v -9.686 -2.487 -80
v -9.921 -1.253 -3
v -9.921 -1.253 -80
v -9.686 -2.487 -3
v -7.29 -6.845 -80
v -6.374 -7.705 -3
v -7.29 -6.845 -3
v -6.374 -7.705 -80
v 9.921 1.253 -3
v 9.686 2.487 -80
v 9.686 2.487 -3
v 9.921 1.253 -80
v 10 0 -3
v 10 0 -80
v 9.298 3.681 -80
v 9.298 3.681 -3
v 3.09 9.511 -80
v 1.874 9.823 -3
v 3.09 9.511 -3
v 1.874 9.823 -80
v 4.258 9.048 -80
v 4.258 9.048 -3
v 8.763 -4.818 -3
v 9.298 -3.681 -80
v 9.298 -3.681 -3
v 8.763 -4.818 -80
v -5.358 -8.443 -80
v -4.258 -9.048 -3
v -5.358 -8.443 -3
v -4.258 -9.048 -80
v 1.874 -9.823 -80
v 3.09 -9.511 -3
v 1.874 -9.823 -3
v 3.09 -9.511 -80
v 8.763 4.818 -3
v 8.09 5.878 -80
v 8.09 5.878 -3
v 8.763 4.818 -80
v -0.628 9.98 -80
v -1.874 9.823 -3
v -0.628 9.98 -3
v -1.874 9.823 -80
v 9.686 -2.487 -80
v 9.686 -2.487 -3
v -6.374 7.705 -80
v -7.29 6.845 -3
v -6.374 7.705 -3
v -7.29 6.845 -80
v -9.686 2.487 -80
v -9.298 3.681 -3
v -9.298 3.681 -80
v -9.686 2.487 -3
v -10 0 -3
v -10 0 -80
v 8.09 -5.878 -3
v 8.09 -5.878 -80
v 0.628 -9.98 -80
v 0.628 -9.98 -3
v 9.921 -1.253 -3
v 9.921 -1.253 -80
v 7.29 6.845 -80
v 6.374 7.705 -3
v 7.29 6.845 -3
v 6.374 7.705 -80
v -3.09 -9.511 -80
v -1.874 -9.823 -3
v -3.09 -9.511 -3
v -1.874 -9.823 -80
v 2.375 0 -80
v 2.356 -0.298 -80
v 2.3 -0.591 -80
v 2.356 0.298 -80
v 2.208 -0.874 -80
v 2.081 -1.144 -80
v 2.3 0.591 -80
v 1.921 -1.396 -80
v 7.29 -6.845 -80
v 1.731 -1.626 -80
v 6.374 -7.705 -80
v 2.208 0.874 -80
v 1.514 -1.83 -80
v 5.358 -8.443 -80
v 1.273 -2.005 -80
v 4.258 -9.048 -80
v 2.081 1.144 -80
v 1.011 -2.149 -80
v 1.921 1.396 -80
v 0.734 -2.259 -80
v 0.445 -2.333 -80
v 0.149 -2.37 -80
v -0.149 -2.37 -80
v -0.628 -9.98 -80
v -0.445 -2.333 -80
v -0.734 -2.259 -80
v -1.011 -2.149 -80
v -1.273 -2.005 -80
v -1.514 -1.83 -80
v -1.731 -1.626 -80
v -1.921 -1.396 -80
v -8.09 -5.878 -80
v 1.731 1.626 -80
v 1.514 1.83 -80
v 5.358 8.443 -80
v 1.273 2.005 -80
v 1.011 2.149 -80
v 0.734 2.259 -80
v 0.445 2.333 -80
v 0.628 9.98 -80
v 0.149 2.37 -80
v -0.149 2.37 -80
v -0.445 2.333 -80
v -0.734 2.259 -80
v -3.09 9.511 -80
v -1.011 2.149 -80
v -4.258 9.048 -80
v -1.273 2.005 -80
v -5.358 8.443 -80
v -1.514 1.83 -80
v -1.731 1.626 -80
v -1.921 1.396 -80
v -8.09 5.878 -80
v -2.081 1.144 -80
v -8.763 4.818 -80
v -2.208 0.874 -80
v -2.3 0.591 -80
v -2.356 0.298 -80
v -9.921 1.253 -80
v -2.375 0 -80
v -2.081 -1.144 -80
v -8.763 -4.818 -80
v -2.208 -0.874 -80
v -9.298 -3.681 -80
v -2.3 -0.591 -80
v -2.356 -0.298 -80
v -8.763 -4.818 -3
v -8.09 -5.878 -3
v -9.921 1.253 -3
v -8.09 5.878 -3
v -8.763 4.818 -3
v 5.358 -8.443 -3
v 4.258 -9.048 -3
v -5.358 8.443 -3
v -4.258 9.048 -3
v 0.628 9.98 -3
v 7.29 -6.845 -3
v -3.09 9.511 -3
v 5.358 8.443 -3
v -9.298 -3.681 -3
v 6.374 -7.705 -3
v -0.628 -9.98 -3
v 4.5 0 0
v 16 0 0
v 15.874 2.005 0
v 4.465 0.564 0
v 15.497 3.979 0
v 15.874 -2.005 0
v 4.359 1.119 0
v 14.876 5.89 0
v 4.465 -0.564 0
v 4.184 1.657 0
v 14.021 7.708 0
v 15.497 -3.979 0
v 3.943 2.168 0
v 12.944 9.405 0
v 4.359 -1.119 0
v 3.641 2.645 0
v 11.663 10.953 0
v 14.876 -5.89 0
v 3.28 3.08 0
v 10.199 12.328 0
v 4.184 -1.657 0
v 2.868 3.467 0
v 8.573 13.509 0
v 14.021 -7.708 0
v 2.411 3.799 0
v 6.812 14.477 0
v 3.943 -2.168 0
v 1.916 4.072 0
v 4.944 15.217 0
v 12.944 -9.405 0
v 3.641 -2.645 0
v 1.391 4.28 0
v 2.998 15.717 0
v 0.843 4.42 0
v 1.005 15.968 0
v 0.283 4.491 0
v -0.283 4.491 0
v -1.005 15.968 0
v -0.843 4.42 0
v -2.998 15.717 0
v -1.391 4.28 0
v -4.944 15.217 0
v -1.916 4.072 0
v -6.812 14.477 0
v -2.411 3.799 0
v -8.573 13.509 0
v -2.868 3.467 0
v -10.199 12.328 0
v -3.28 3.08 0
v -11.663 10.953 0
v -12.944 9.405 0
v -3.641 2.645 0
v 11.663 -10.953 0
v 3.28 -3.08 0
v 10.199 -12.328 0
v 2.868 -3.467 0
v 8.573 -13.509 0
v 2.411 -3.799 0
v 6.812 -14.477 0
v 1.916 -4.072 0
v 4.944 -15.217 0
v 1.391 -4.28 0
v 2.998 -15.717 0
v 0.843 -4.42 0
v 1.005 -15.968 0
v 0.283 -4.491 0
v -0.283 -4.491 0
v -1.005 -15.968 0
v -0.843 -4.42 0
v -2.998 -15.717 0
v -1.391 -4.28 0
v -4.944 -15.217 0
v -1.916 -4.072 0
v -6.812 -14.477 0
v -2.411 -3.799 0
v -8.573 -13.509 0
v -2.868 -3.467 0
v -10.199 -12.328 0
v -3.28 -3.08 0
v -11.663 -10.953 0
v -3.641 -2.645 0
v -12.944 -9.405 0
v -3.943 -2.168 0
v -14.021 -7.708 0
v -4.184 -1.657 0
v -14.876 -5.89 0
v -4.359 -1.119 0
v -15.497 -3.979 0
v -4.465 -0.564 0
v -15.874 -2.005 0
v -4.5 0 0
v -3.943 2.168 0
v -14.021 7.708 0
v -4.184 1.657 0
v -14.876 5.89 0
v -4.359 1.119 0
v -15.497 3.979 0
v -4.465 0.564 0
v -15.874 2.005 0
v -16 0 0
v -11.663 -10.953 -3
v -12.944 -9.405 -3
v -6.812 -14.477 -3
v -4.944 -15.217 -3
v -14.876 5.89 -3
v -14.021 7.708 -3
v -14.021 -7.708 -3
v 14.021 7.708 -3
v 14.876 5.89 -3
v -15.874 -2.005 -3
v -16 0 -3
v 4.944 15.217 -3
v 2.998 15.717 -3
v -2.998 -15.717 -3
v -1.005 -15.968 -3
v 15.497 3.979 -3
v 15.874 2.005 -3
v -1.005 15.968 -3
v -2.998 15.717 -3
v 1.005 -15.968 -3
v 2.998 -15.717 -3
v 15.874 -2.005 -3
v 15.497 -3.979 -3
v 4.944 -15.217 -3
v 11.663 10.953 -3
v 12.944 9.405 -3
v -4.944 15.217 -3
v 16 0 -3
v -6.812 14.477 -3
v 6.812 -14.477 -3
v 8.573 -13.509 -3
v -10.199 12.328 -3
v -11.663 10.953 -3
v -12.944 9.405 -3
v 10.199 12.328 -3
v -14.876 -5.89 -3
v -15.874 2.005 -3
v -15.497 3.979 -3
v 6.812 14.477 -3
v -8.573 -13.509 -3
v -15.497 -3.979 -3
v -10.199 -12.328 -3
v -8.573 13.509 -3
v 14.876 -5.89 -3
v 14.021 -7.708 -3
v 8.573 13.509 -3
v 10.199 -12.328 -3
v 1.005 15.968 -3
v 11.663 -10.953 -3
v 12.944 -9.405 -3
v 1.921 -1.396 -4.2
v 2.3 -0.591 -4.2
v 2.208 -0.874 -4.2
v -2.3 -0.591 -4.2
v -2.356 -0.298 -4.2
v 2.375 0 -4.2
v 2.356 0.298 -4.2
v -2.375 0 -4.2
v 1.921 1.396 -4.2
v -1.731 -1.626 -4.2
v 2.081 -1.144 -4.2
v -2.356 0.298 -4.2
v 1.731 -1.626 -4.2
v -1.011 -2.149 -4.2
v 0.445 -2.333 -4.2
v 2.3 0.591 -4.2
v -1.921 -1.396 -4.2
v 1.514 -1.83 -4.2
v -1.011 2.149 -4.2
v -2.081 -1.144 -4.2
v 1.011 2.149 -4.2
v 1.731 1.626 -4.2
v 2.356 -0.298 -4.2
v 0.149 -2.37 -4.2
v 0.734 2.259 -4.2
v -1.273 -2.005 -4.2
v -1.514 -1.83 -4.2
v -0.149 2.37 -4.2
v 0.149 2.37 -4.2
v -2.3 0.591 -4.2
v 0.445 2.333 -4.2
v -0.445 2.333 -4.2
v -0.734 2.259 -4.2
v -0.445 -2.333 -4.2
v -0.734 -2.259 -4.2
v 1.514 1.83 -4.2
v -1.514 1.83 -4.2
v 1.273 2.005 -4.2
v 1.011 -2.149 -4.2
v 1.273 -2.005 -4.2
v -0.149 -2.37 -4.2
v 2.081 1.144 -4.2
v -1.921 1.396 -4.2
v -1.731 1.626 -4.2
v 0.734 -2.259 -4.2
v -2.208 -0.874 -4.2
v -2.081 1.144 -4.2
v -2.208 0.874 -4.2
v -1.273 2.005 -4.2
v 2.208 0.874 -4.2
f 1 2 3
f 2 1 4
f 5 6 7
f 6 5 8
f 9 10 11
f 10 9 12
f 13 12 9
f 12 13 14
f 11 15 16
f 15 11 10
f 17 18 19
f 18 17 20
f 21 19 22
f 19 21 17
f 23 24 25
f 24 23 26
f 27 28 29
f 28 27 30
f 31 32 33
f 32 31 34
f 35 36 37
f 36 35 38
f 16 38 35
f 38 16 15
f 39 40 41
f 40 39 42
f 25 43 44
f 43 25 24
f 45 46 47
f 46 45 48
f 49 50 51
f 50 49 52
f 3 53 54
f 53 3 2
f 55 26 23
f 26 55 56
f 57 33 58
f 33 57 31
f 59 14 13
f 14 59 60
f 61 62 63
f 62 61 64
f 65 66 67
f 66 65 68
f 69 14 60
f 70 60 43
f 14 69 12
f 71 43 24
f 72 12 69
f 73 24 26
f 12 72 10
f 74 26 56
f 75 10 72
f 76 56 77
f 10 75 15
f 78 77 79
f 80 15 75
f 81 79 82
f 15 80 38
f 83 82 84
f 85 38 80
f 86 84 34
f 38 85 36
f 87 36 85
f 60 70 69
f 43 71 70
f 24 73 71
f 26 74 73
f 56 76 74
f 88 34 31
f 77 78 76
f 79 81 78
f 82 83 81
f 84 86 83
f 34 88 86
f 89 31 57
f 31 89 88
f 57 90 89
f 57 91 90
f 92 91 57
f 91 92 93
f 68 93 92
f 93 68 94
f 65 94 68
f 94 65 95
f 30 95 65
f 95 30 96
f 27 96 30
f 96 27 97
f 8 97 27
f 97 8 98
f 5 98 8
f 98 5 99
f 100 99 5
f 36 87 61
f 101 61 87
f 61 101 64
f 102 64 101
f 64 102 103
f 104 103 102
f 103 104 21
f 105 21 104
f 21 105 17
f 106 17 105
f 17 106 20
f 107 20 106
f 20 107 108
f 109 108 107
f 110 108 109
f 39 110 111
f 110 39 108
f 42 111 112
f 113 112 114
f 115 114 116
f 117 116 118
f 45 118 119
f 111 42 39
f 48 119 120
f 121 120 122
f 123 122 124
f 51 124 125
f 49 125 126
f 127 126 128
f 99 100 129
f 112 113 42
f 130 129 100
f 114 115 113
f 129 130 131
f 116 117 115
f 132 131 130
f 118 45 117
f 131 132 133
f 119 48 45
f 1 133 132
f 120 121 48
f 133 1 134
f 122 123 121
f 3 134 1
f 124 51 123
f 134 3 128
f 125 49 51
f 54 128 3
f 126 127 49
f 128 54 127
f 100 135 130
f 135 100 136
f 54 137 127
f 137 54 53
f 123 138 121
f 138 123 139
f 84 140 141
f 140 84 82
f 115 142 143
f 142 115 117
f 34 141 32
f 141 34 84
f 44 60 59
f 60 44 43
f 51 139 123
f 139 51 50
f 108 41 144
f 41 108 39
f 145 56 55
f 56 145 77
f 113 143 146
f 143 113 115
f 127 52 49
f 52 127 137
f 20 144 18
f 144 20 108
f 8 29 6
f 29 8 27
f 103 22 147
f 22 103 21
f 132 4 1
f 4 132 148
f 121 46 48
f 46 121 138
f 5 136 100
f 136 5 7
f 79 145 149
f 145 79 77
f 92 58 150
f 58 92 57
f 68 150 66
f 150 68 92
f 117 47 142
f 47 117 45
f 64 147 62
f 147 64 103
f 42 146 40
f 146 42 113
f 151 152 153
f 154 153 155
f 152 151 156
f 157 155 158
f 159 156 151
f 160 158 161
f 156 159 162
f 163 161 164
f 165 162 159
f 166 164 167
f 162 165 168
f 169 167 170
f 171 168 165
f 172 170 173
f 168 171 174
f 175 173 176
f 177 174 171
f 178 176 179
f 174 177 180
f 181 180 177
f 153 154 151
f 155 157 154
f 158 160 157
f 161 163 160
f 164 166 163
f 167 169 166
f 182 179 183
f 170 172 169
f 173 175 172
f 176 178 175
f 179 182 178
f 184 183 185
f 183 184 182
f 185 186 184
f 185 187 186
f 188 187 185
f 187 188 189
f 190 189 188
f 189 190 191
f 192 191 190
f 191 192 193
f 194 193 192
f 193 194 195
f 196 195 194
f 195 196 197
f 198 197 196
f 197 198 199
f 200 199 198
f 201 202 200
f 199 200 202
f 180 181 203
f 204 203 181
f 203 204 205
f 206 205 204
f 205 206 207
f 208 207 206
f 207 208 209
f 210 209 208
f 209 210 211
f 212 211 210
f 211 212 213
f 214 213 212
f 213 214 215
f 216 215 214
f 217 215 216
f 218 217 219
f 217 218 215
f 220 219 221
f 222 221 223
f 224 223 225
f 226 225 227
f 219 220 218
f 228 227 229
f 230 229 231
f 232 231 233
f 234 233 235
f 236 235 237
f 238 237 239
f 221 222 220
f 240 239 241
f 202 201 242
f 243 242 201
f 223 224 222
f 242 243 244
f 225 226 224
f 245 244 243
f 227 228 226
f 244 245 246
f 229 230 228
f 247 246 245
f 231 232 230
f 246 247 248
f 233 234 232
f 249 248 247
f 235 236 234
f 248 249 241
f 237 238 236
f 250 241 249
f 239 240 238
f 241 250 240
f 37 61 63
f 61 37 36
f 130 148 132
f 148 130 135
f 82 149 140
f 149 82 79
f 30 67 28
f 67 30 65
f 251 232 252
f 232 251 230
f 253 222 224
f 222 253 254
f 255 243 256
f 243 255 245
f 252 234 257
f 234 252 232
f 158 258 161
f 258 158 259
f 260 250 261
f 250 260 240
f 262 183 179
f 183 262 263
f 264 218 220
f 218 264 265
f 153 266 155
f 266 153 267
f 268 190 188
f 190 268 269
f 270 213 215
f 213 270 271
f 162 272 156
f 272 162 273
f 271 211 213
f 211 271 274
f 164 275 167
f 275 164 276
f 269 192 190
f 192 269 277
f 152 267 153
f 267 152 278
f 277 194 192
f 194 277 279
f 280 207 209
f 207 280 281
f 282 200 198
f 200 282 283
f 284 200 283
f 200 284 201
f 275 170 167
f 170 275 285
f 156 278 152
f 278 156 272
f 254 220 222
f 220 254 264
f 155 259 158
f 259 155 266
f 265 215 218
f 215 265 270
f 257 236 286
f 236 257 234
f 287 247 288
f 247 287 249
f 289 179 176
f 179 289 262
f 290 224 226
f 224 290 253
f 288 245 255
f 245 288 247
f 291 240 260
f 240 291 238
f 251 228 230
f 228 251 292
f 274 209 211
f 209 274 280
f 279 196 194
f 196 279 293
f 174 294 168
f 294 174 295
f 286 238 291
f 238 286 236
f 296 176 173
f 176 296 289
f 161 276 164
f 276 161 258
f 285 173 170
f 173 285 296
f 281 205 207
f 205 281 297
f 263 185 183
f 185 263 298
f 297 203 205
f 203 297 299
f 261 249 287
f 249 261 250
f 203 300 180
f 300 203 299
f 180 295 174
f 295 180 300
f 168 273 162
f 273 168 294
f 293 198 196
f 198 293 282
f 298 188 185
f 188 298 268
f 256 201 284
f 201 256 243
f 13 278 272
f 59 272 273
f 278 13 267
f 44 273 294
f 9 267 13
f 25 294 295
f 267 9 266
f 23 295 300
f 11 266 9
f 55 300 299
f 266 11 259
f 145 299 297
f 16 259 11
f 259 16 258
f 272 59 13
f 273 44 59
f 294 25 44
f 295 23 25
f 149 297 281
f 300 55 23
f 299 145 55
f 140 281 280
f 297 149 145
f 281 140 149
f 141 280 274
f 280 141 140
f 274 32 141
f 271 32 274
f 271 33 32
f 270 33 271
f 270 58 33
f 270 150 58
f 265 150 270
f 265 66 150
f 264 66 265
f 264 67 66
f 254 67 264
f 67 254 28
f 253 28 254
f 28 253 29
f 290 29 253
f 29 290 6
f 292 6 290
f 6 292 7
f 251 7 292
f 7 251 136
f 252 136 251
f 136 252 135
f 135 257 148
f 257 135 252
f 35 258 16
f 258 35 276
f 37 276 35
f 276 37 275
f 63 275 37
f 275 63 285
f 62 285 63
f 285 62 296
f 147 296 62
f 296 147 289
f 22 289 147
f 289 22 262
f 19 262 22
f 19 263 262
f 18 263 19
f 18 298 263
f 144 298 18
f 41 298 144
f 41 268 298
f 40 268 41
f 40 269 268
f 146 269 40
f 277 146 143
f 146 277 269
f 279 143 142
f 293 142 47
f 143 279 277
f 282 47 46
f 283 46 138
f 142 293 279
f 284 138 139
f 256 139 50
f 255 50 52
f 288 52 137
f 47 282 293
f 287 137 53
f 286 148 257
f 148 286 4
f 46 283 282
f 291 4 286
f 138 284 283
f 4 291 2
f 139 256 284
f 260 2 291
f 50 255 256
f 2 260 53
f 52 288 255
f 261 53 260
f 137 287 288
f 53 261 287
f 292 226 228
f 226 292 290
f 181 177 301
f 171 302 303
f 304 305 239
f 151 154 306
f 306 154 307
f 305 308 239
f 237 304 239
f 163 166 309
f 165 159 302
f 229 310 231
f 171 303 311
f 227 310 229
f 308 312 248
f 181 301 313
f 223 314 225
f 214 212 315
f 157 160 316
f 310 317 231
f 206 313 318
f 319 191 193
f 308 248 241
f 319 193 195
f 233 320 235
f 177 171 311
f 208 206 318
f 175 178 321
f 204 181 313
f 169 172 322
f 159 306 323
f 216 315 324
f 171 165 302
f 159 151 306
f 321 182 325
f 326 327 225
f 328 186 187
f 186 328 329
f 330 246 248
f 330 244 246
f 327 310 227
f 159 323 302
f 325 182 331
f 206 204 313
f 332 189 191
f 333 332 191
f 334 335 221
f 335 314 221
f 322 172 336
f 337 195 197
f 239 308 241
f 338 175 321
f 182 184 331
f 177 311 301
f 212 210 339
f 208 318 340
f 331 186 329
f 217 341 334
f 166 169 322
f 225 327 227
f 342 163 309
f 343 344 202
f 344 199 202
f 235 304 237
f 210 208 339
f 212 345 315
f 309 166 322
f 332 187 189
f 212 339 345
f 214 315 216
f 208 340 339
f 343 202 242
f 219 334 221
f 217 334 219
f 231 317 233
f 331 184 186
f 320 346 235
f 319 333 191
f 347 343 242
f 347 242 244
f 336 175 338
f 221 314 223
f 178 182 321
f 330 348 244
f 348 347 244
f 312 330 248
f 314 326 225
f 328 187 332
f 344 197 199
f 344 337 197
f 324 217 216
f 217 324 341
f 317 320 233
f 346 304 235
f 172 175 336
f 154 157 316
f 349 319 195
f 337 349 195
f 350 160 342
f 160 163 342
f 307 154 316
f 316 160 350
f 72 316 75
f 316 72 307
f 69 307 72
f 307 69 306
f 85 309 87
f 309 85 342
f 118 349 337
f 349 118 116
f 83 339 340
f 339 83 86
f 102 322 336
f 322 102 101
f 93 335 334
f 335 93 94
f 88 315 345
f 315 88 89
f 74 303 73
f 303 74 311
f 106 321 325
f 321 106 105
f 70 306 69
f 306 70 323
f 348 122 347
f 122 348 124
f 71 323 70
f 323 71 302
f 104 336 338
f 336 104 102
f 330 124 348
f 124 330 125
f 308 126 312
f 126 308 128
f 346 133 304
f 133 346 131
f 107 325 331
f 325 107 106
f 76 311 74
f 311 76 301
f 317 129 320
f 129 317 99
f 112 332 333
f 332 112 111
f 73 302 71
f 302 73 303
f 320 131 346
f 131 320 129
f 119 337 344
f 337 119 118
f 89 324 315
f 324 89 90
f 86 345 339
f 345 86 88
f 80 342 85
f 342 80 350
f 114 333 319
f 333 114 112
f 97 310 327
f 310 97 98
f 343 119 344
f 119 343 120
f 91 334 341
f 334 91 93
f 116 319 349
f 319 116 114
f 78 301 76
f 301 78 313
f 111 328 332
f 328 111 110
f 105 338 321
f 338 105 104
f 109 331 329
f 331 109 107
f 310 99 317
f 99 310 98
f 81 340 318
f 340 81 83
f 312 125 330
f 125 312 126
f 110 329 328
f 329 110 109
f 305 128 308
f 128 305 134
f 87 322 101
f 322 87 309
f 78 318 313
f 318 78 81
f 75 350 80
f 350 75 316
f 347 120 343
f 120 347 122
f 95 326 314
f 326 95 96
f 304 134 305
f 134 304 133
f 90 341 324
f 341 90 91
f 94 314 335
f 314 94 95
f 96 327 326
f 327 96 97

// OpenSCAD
$fn = 50;


difference() {
	union() {
		translate(v = [0, 0, -80.0000000000]) {
			cylinder(h = 80, r = 10.0000000000);
		}
		translate(v = [0, 0, -3.0000000000]) {
			cylinder(h = 3, r = 16.0000000000);
		}
	}
	union() {
		translate(v = [0, 0, 0]) {
			rotate(a = [0, 0, 0]) {
				difference() {
					union() {
						#translate(v = [0, 0, -80.0000000000]) {
							cylinder(h = 80, r = 2.2500000000);
						}
						#translate(v = [0, 0, -4.2000000000]) {
							cylinder(h = 4.2000000000, r1 = 2.3750000000, r2 = 4.5000000000);
						}
						#translate(v = [0, 0, -80.0000000000]) {
							cylinder(h = 80, r = 2.3750000000);
						}
						#translate(v = [0, 0, -80.0000000000]) {
							cylinder(h = 80, r = 2.2500000000);
						}
					}
					union();
				}
			}
		}
	}
}
